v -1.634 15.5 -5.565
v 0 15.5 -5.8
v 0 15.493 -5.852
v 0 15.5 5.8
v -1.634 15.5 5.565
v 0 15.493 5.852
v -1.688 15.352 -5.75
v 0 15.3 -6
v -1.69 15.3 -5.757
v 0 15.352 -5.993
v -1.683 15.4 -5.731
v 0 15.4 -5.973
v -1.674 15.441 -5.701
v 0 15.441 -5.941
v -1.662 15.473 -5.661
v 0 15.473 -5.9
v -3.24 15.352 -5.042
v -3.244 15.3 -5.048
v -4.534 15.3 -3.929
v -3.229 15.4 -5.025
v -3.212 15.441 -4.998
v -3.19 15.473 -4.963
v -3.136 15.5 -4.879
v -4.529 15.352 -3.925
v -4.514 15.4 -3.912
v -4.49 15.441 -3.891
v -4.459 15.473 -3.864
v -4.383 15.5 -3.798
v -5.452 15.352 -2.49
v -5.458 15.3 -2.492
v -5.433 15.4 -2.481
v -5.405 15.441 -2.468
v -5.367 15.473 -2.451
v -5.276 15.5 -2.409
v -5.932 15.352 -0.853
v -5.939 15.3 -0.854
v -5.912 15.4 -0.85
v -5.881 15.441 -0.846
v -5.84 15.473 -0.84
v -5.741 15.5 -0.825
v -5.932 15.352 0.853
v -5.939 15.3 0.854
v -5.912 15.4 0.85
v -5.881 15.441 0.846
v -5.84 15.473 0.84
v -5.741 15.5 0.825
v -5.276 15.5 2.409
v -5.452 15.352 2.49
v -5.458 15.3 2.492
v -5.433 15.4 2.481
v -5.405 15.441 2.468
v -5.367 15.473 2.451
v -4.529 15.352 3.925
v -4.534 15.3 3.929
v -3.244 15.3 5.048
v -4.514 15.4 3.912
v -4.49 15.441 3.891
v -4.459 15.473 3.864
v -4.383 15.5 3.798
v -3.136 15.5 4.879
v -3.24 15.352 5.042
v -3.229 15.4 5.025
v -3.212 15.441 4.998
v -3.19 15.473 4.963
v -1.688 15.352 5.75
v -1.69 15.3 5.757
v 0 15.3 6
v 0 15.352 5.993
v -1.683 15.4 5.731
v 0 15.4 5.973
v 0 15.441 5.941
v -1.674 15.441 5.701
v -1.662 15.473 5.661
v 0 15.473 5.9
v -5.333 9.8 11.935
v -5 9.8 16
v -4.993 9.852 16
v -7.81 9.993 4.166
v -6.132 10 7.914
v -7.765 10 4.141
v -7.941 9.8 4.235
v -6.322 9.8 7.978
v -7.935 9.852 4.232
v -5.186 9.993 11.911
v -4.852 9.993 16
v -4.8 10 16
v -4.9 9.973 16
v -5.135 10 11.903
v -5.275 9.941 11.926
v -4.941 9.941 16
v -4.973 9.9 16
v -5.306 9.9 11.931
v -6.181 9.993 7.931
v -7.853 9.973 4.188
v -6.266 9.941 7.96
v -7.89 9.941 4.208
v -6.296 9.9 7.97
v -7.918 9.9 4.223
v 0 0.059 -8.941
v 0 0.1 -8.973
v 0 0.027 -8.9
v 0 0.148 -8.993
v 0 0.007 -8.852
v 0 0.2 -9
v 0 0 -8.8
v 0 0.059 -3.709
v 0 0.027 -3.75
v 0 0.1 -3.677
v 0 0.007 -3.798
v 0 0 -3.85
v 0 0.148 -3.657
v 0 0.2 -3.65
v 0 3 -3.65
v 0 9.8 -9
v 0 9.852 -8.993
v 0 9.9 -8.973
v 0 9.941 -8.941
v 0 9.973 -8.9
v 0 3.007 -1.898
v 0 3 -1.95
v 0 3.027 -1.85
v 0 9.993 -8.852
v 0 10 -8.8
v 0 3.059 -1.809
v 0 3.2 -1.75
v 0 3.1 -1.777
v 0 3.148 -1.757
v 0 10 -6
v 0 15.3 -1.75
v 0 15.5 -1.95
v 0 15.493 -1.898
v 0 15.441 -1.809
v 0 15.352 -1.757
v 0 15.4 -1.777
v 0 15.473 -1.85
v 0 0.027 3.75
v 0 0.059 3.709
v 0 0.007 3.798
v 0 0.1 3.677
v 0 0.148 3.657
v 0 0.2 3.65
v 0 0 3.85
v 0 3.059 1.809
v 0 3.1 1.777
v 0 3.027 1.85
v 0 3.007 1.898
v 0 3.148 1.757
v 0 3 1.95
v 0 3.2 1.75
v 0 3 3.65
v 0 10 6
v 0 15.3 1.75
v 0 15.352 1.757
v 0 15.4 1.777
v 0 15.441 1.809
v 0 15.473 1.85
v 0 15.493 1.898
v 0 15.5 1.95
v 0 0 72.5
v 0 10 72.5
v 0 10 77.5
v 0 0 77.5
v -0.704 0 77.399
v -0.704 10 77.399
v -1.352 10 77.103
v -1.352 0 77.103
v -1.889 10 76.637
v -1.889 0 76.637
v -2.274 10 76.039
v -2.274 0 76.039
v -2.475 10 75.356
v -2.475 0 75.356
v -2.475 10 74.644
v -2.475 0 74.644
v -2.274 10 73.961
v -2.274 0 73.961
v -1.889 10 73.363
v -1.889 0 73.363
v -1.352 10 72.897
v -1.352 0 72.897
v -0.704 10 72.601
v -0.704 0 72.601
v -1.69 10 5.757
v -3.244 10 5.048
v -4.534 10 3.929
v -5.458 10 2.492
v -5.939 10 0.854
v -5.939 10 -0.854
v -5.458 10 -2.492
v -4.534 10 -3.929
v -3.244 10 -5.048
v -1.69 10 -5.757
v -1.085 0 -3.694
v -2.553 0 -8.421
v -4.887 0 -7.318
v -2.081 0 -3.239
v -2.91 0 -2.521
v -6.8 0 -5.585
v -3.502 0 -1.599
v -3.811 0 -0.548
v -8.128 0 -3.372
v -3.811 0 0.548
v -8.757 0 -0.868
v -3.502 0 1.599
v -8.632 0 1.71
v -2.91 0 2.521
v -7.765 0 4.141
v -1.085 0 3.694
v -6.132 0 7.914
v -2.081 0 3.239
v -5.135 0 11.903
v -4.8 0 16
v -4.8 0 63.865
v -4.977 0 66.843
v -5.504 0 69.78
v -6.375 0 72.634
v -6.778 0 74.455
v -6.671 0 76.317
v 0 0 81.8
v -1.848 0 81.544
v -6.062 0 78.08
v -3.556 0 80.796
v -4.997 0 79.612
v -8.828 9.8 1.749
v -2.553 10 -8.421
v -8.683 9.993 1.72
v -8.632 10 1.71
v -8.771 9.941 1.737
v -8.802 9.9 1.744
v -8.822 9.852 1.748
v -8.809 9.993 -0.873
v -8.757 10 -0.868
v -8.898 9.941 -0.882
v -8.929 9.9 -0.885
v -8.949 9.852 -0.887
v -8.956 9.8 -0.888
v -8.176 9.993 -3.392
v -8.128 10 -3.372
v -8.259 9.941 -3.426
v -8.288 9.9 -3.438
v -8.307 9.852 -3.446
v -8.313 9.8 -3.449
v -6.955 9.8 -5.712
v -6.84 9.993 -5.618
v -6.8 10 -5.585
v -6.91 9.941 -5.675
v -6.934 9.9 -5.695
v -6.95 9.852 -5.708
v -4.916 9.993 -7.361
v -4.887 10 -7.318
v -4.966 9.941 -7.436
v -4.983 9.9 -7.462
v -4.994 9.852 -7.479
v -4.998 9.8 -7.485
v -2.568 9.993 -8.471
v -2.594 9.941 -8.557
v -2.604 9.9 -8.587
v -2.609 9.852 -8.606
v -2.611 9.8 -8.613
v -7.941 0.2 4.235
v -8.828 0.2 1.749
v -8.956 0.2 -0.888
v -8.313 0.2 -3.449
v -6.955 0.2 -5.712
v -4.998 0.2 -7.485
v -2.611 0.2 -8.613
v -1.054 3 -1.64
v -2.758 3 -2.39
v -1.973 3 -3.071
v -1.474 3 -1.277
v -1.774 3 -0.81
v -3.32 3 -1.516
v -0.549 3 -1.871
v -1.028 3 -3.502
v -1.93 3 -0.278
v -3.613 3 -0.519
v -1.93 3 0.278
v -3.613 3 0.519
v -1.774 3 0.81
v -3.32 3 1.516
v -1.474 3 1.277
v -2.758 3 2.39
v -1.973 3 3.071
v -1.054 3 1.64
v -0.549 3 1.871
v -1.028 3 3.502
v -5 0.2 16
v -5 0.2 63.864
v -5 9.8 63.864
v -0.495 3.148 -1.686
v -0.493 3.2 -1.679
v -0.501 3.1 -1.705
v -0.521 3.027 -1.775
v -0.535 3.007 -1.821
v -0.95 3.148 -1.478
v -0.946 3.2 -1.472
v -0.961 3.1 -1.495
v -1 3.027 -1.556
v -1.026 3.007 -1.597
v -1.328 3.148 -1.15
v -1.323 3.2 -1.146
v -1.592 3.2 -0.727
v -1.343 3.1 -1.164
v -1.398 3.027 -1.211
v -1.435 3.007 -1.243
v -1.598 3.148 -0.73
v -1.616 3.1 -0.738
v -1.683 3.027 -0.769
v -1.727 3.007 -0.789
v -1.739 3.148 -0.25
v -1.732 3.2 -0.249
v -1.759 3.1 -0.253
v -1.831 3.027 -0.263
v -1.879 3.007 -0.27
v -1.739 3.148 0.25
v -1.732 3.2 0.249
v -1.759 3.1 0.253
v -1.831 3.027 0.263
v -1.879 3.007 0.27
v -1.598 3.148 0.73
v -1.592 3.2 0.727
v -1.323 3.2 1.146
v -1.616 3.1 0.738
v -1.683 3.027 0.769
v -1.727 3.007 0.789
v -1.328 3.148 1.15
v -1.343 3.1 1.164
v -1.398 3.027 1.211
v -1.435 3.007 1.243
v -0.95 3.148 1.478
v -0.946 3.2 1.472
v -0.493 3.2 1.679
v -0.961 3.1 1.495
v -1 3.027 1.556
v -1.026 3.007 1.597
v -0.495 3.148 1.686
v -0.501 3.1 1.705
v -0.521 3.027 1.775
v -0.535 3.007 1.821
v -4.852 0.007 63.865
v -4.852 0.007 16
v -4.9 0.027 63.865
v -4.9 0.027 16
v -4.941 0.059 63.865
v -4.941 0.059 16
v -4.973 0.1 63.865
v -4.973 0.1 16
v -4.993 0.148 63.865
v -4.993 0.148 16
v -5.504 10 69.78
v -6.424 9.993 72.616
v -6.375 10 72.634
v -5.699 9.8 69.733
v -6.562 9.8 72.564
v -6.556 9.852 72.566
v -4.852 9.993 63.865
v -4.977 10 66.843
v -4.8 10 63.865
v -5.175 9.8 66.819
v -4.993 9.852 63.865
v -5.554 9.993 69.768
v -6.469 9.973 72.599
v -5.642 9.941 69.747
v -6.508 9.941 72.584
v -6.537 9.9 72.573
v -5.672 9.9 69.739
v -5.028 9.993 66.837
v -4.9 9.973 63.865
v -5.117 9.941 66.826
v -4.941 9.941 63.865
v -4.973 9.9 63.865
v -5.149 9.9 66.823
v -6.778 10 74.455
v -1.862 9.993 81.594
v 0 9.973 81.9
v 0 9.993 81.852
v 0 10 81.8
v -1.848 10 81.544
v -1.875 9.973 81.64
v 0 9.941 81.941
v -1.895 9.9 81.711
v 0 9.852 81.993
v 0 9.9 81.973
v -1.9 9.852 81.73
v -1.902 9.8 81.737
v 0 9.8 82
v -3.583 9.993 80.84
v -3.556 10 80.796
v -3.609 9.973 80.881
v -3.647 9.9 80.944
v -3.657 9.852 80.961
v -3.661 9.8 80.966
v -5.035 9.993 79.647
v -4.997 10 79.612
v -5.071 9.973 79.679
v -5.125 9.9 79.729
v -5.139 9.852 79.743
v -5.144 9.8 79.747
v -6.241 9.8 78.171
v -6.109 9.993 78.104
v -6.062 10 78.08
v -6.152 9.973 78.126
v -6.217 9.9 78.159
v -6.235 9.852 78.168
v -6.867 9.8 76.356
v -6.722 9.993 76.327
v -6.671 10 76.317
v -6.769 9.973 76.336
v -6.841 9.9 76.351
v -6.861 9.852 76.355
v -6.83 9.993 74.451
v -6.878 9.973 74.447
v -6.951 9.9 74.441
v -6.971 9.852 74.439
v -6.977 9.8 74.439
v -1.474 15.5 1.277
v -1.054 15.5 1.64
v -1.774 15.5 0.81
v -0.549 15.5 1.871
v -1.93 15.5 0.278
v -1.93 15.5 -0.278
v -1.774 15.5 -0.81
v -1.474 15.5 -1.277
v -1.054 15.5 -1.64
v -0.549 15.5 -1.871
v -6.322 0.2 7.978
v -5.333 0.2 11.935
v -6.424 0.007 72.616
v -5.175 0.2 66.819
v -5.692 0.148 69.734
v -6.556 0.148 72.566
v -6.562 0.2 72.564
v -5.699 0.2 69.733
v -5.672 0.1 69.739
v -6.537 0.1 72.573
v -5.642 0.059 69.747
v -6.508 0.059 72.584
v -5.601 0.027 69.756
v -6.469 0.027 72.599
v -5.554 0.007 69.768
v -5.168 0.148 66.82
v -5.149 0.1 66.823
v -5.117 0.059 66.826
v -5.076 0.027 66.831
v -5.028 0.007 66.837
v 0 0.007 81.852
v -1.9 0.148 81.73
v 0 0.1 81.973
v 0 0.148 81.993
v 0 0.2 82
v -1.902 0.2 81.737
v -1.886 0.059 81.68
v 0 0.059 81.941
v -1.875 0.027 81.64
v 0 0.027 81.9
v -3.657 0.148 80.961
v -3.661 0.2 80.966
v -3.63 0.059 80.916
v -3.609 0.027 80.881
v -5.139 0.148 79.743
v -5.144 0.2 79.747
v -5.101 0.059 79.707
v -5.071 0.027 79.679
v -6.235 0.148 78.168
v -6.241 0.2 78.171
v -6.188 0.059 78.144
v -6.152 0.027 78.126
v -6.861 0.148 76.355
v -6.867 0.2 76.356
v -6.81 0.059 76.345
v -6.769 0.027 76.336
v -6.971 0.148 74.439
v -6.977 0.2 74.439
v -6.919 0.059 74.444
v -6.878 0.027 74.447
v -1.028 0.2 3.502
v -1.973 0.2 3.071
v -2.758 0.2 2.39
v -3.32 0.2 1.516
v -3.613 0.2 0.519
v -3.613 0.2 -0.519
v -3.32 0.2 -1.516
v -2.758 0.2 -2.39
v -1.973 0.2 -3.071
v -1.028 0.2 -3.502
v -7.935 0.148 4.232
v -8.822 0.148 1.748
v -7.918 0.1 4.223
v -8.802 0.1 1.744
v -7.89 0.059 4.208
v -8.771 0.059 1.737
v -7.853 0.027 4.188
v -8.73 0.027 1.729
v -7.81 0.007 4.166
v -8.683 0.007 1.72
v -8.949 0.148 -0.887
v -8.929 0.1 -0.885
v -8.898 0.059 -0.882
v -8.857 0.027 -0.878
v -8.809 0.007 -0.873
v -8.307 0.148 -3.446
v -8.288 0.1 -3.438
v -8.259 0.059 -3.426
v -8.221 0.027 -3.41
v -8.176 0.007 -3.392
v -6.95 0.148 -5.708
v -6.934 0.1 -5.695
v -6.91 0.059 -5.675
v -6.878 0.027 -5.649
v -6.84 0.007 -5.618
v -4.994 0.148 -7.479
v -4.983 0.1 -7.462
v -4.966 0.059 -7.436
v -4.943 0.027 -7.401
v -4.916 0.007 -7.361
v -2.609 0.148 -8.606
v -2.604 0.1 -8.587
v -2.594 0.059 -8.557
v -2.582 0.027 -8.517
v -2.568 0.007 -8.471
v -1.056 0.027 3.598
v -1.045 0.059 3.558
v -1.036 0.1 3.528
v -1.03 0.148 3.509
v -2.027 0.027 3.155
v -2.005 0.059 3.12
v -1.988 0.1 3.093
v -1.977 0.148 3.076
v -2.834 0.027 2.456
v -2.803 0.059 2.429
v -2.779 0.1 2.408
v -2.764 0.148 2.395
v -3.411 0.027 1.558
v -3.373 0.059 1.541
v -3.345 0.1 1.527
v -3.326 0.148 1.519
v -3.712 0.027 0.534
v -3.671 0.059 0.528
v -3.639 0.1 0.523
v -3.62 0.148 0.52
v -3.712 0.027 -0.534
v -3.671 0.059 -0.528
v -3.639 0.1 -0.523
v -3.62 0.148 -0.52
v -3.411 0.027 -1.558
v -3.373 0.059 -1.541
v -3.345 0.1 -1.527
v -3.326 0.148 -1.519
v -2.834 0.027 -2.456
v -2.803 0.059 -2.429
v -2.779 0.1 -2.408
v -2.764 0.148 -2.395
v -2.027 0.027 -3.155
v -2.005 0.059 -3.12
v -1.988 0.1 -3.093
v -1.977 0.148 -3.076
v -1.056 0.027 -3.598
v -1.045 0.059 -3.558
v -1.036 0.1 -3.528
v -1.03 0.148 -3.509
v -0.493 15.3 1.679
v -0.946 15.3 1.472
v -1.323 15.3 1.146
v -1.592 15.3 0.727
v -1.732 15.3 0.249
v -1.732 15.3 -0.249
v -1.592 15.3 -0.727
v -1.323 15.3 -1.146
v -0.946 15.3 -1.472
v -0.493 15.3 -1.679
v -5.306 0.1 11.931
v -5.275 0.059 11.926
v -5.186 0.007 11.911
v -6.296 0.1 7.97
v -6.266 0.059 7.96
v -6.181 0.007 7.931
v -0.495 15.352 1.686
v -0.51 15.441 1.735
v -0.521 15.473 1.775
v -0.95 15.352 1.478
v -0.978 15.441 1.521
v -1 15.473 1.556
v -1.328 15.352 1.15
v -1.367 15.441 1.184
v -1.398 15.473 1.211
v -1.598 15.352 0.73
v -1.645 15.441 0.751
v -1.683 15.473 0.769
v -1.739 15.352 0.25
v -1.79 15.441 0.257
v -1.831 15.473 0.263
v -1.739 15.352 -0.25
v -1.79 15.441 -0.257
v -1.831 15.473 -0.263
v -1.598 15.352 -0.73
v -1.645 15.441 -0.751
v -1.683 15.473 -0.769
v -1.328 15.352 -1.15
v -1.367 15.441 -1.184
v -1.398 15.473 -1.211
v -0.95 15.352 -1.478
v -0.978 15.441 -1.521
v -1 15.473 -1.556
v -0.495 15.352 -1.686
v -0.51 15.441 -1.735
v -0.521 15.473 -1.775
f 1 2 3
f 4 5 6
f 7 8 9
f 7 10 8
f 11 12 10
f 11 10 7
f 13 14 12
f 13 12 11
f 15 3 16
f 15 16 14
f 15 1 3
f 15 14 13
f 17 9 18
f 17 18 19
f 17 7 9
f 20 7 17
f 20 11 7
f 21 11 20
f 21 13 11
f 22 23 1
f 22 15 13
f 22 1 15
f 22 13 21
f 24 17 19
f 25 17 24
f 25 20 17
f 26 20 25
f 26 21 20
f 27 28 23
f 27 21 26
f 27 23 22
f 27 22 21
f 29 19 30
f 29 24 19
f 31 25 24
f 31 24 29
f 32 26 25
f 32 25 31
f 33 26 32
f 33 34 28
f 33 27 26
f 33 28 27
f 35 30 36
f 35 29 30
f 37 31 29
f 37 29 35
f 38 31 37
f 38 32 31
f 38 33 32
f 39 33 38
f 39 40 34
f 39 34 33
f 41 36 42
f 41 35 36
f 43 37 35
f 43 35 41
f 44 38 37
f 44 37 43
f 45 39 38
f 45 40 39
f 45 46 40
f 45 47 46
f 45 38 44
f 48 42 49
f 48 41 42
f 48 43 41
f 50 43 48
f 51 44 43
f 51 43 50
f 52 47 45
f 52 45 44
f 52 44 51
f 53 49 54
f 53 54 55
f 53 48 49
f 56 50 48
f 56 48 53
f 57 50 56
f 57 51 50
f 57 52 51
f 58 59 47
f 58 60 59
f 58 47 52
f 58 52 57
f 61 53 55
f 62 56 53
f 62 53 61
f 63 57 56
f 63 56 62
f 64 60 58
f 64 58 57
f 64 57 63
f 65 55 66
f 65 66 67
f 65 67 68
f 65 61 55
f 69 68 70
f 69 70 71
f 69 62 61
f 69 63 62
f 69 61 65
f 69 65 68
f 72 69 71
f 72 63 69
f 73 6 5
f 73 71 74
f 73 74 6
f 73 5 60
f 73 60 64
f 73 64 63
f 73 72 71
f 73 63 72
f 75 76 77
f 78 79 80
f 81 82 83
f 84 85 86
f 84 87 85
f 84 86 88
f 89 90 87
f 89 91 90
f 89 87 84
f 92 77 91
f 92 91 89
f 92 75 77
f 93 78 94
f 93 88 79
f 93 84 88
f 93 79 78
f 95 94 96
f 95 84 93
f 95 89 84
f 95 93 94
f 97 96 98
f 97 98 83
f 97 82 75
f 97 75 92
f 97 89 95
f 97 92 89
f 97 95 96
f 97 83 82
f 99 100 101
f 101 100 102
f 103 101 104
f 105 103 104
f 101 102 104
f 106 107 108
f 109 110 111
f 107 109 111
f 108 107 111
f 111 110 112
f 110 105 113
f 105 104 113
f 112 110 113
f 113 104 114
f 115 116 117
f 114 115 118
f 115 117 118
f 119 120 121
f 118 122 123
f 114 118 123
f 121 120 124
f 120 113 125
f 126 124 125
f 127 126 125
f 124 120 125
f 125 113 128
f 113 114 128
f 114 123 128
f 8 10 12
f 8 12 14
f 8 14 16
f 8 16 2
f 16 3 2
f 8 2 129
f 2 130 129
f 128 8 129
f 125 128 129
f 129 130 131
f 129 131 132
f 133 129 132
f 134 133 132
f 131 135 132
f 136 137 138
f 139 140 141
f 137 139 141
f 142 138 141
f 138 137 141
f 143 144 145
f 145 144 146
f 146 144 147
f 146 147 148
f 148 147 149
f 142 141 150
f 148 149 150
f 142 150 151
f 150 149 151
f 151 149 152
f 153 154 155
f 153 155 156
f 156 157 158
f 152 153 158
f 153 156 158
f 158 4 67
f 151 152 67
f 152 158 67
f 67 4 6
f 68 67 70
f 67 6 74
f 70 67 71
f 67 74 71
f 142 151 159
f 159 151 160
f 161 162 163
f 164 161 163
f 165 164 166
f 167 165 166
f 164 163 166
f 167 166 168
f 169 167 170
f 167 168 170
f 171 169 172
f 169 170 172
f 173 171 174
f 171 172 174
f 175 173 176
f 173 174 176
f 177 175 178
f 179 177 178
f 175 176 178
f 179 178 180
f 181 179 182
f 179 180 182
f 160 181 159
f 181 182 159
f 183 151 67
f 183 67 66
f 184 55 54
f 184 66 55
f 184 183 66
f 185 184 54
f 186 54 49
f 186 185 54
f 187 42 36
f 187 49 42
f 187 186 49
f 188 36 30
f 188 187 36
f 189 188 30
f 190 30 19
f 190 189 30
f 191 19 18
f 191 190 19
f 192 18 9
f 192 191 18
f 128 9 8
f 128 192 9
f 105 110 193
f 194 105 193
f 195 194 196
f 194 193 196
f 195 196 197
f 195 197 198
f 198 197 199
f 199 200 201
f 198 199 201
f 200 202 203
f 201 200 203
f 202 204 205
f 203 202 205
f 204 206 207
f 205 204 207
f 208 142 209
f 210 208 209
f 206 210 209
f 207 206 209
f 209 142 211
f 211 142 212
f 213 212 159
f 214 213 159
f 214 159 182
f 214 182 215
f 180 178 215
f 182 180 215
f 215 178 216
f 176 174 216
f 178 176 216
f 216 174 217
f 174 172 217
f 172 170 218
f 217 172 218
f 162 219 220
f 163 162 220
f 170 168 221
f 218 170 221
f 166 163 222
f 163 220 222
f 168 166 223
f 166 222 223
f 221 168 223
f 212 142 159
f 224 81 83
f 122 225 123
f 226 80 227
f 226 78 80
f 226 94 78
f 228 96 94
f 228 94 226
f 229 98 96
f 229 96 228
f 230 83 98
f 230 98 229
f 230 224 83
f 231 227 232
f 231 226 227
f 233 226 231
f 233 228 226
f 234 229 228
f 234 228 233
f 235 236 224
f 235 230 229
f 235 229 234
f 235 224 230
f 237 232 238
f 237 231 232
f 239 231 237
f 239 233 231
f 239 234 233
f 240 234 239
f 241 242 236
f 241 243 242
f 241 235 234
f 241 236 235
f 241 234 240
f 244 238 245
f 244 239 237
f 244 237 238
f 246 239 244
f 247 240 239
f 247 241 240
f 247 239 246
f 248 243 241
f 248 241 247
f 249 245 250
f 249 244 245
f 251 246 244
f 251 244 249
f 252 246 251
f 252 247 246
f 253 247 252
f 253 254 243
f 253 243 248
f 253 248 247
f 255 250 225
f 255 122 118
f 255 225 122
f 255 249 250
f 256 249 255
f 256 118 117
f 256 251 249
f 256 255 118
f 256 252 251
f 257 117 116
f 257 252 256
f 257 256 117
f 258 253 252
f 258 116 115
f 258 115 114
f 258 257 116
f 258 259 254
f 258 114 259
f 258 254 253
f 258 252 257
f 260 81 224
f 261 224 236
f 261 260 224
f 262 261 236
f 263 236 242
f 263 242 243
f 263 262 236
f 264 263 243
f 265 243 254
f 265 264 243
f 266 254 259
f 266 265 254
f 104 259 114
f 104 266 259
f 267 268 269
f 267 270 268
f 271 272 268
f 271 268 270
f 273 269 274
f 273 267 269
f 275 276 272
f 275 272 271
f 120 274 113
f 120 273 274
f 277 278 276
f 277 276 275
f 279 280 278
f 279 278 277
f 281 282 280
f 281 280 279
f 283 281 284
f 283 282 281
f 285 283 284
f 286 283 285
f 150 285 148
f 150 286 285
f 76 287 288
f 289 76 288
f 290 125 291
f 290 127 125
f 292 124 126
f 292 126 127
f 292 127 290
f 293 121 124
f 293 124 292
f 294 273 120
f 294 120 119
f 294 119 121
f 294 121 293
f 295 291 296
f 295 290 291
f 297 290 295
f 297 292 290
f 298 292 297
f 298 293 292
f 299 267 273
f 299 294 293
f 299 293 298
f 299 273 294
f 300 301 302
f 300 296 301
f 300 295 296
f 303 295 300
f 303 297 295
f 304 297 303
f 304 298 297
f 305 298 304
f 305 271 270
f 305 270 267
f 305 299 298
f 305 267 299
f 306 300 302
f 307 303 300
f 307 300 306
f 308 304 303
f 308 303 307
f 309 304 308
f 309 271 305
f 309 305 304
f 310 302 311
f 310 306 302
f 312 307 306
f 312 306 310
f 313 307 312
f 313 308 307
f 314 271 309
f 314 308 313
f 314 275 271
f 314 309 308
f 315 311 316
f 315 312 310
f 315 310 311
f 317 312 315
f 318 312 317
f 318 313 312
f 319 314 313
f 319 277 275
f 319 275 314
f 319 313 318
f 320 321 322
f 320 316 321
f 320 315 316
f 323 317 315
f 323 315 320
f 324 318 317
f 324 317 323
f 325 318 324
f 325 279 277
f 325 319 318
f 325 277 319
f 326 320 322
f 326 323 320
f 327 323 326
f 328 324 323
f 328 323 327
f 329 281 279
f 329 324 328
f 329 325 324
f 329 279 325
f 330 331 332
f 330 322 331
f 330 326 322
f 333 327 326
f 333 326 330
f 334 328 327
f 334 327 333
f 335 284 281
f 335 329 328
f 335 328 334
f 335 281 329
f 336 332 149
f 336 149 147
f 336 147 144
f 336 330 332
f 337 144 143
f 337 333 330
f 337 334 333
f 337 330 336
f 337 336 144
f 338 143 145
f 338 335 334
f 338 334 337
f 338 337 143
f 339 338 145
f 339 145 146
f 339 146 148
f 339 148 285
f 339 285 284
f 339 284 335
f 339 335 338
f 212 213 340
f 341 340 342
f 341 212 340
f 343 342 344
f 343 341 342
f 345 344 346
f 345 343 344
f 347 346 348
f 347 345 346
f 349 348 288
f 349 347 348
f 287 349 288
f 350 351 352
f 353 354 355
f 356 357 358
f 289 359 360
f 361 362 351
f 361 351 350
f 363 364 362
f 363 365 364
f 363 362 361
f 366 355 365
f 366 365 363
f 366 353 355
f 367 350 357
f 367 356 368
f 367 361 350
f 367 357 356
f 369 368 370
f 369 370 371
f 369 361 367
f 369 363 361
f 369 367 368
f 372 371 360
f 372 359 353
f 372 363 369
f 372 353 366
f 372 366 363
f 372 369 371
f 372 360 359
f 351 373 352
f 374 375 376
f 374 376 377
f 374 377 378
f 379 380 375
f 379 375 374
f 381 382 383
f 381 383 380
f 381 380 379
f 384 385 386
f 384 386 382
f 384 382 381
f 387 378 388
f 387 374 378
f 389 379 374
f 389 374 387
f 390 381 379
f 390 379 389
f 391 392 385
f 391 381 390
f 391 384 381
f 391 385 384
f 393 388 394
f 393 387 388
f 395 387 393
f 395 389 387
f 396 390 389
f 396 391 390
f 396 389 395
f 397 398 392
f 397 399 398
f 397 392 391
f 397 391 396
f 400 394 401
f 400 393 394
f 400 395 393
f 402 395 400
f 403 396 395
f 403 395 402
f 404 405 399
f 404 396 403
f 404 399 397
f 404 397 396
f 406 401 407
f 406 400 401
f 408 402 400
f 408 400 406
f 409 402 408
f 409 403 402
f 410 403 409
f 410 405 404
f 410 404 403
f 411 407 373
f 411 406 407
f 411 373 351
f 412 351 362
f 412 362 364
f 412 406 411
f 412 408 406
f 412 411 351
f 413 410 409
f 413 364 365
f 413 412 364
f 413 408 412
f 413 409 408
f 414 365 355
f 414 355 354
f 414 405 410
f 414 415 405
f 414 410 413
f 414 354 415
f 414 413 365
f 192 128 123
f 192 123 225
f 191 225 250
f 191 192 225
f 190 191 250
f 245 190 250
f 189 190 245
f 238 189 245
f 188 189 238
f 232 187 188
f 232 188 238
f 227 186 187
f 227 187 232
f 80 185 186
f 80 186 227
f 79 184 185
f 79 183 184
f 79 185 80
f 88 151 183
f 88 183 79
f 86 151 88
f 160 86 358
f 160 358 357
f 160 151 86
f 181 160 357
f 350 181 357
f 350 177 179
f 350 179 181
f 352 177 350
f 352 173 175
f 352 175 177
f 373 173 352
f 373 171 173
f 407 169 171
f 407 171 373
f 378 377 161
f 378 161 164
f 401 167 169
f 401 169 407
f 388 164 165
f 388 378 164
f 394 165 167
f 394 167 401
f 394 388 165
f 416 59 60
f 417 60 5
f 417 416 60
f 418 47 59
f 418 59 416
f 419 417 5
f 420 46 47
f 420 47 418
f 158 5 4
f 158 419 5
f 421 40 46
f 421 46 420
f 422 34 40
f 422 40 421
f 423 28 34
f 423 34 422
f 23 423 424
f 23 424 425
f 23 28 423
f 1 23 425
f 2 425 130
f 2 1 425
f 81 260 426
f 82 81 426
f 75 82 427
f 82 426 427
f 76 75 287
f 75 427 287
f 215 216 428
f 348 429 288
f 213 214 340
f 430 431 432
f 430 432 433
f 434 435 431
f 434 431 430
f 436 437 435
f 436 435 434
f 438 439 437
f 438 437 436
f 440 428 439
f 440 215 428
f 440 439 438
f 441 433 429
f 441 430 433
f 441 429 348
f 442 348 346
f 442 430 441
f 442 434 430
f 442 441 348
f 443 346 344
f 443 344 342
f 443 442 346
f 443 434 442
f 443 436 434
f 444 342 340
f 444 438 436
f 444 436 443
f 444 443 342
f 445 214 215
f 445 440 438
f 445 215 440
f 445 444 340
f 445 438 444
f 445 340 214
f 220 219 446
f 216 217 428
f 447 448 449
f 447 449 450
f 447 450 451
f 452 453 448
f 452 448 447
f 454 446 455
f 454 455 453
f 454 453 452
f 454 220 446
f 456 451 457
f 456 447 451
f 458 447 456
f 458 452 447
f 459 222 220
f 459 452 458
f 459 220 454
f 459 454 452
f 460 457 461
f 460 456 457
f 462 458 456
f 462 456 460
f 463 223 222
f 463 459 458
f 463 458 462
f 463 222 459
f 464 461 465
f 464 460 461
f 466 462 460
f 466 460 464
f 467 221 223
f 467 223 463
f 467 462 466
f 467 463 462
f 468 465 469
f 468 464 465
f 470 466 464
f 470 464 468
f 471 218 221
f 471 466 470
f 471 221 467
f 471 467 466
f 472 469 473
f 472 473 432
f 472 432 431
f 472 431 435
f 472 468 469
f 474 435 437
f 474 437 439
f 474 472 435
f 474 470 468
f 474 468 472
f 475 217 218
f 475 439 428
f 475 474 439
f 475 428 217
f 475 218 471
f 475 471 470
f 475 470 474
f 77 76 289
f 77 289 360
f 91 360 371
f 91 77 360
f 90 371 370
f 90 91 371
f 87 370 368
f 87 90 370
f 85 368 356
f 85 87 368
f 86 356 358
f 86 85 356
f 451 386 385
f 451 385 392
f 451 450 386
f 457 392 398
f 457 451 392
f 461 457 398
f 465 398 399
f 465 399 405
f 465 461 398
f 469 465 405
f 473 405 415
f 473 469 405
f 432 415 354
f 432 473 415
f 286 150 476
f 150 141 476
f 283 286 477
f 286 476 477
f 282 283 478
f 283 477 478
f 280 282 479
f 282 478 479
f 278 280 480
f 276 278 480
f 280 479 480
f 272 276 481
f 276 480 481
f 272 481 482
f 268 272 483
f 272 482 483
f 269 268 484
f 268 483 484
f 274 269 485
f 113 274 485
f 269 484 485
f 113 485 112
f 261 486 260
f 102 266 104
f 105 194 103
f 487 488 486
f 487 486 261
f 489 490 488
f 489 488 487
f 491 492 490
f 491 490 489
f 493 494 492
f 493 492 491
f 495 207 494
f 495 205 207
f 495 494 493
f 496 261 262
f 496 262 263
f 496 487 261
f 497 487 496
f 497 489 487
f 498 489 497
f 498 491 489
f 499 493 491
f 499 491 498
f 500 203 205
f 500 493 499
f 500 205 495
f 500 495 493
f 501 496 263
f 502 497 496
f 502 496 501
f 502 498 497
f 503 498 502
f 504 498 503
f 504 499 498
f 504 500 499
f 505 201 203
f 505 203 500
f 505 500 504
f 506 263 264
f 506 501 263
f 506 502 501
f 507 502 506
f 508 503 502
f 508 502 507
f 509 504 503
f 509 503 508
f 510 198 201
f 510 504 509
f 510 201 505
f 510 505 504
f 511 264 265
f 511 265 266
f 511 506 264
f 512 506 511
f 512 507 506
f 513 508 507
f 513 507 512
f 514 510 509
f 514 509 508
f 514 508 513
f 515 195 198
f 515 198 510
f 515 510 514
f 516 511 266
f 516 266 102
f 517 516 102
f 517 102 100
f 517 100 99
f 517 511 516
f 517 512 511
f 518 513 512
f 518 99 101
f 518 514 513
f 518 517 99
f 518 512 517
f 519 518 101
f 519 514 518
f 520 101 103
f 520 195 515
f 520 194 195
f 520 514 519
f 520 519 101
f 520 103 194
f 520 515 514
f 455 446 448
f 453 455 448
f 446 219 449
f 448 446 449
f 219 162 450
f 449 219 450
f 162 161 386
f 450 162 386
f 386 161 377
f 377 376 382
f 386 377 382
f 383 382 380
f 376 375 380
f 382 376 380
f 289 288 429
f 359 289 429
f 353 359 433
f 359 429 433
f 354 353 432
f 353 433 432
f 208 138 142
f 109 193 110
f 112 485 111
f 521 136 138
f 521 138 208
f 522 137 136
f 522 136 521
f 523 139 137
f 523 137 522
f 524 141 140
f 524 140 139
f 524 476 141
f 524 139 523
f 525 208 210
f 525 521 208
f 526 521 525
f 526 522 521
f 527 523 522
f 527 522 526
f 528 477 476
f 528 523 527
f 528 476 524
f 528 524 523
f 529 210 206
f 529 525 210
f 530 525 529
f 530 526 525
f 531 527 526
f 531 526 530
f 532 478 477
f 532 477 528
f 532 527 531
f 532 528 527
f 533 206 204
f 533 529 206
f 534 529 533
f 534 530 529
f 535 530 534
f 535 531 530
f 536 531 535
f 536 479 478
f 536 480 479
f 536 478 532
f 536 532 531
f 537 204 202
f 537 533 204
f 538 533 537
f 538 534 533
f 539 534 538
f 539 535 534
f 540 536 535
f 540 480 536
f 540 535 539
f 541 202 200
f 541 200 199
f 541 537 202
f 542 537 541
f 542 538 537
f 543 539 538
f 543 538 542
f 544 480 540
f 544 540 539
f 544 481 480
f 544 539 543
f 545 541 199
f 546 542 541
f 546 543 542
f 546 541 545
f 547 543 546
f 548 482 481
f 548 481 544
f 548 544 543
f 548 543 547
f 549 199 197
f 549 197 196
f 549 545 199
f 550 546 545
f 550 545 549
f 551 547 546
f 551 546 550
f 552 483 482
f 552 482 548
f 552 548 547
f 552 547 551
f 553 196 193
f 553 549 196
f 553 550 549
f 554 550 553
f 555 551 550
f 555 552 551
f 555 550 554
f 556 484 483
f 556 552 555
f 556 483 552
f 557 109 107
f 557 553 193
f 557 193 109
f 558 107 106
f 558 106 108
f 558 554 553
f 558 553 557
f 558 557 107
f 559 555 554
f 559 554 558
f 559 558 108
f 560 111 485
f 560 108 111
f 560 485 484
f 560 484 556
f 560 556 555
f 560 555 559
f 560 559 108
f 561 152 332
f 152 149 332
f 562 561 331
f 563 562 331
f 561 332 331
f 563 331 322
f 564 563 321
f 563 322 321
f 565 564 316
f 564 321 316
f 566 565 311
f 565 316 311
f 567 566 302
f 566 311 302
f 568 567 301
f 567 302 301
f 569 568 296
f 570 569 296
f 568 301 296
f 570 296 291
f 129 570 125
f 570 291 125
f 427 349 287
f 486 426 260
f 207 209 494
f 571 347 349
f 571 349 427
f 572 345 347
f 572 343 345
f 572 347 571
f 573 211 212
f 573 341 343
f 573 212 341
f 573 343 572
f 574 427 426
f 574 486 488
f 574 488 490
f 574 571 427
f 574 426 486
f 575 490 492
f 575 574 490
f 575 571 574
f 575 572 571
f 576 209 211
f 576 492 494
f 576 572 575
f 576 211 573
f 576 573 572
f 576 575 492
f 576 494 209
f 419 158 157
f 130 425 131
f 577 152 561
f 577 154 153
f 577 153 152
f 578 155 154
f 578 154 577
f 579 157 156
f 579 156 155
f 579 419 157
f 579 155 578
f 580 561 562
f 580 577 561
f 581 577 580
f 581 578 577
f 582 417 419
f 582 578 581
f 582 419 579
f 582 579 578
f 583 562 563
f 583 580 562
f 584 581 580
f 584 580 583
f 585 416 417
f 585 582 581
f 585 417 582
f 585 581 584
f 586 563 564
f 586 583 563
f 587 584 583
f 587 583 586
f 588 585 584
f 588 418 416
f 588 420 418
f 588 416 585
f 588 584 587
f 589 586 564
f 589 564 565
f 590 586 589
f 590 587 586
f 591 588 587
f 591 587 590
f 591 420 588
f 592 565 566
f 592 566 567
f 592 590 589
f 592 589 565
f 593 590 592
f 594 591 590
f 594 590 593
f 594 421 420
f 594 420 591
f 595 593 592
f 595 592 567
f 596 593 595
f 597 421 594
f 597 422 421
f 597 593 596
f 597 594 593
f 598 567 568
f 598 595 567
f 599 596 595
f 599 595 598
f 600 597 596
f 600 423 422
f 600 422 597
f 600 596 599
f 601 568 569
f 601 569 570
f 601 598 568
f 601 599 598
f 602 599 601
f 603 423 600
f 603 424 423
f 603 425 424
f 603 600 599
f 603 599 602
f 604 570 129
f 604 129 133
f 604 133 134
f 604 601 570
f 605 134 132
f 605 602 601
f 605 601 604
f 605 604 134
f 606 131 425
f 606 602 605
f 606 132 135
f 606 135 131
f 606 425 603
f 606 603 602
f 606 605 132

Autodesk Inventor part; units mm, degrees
ref_plane "YZ Plane" through (0, 0, 0) normal (1, 0, 0) x (0, 1, 0)
ref_plane "XZ Plane" through (0, 0, 0) normal (0, 1, 0) x (-1, 0, 0)
ref_plane "XY Plane" through (0, 0, 0) normal (0, 0, 1) x (1, 0, 0)
sketch "Skizze1" plane through (0, 0, 0) normal (0, 1, 0) x (-1, 0, 0)
  line L0 (0, 100) -> (0, 100)
  line L1 (-5, 63.8645) -> (-5, 16)
  line L2 (5, 16) -> (5, 63.8645)
  arc A0 (-7.9412, 4.2353) -> (7.9412, 4.2353) centre (0, 0) ccw
  arc A1 (5, 16) -> (7.9412, 4.2353) centre (30, 16) ccw
  arc A2 (-7.9412, 4.2353) -> (-5, 16) centre (-30, 16) ccw
  line L3 (0, -30.8) -> (0, 121.8) projected
  circle A3 centre (0, 75) radius 2.5
  arc A4 (6.5625, 72.5641) -> (-6.5625, 72.5641) centre (0, 75) ccw
  arc A5 (-5, 63.8645) -> (-6.5625, 72.5641) centre (-30, 63.8645) ccw
  arc A6 (6.5625, 72.5641) -> (5, 63.8645) centre (30, 63.8645) ccw
  point P0 (0, 0)
  point P1 (-5, 7.4833)
  point P2 (5, 7.4833)
  point P3 (-5, 70.101)
  point P4 (5, 70.101)
  dimension "d2" = 18
  dimension "d4" = 25
  dimension "d10" = 0
  dimension "d33" = 5
  dimension "d34" = 5
  dimension "d49" = 75
  dimension "d51" = 5
  dimension "d54" = 14
extrude "Extrusion1" add sketch "Skizze1" along normal blind 10
sketch "Skizze8" plane through (0, 10, 0) normal (0, 1, 0) x (1, 0, 0)
  circle A0 centre (0, 0) radius 6
  dimension "d36" = 12
extrude "Extrusion5" add sketch "Skizze8" along normal blind 5.5
fillet "Rundung3" radius 0.2 1 edges at (-6, 15.5, 0)
fillet "Rundung4" radius 0.2 10 edges at (-5.7464, 10, 9.9366) (-5, 10, 39.9322) (5, 10, 39.9322) (5.7464, 10, 9.9366) (0, 10, -9) (-5.7464, 0, 9.9366) (-5, 0, 39.9322) (5, 0, 39.9322) (5.7464, 0, 9.9366) (0, 0, -9)
sketch "Skizze10" plane through (0, 0, 0) normal (0, -1, 0) x (1, 0, 0)
  circle A0 centre (0, 0) radius 3.65
  dimension "d41" = 7.3
extrude "Extrusion6" cut sketch "Skizze10" against normal blind 3
sketch "Skizze11" plane through (0, 3, 0) normal (0, -1, 0) x (1, 0, 0)
  circle A0 centre (0, 0) radius 1.75
  dimension "d44" = 3.5
extrude "Extrusion7" cut sketch "Skizze11" against normal up to next
fillet "Rundung5" radius 0.2 2 edges at (-1.75, 3, 0) (-3.65, 0, 0)
fillet "Rundung6" radius 0.2 1 edges at (-1.75, 15.5, 0)
extrude "Extrusion8" cut sketch "Skizze1" along normal up to next contours A3 L3 | L3 A3
sketch "Skizze12" plane through (0, 15.5, 0) normal (0, 1, 0) x (1, 0, 0)
  line L0 (0, -83.6989) -> (25.2084, -83.6989)
  line L1 (25.2084, -83.6989) -> (25.2084, 12.8308)
  line L2 (25.2084, 12.8308) -> (0, 12.8308)
  line L3 (0, 12.8308) -> (0, -83.6989)
  point P0 (0, 0)
extrude "Extrusion9" cut sketch "Skizze12" against normal up to next
properties part number "alternativeJoint"
